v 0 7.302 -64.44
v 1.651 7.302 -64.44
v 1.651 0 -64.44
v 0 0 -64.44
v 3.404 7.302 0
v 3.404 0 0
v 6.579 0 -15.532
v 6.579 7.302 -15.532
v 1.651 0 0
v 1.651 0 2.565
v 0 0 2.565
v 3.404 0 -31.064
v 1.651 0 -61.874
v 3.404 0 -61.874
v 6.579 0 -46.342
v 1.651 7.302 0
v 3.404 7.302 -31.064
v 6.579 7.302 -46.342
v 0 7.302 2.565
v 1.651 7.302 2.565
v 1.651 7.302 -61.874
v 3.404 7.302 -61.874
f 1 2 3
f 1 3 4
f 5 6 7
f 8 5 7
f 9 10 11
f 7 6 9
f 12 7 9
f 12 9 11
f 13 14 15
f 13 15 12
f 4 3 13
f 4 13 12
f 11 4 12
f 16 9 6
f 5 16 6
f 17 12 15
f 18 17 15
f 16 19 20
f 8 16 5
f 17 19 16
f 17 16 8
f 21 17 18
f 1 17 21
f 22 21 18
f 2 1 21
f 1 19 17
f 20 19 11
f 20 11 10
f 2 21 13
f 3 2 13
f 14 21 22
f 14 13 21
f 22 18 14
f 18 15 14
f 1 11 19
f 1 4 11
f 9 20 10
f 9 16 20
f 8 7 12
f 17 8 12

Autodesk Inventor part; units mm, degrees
ref_plane "YZ Plane" through (0, 0, 0) normal (1, 0, 0) x (0, 1, 0)
ref_plane "XZ Plane" through (0, 0, 0) normal (0, 1, 0) x (-1, 0, 0)
ref_plane "XY Plane" through (0, 0, 0) normal (0, 0, 1) x (1, 0, 0)
sketch "Sketch1" plane through (0, 0, 0) normal (0, 1, 0) x (-1, 0, 0)
  line L0 (0, 0) -> (0, -61.8744)
  line L1 (0, 0) -> (-3.4036, 0)
  line L2 (0, -61.8744) -> (-3.4036, -61.8744)
  line L3 (-3.4036, 0) -> (-6.5786, -15.5321)
  line L4 (-6.5786, -15.5321) -> (-3.4036, -31.0642)
  line L5 (-3.4036, -31.0642) -> (-6.5786, -46.3423)
  line L6 (-6.5786, -46.3423) -> (-3.4036, -61.8744)
  dimension "d0" = 61.8744
  dimension "d1" = 3.4036
  dimension "d2" = 3.4036
  dimension "d3" = 15.5321
  dimension "d4" = 31.0642
  dimension "d5" = 15.5321
  dimension "d6" = 3.175
  dimension "d7" = 3.175
extrude "Extrusion1" add sketch "Sketch1" along normal blind 7.3025
sketch "Sketch2" plane through (0, 0, 0) normal (0, 0, 1) x (1, 0, 0)
  line L0 (3.4036, 0) -> (0, 0) projected
  line L1 (0, 7.3025) -> (1.651, 7.3025)
  line L2 (1.651, 7.3025) -> (1.651, 0)
  line L3 (1.651, 0) -> (0, 0)
  line L4 (0, 0) -> (0, 7.3025)
  dimension "d10" = 1.651
sketch "Sketch3" plane through (3.4036, 0, -61.8744) normal (0, 0, -1) x (-1, 0, 0)
  line L0 (0, 0) -> (3.4036, 0) projected
  line L1 (3.4036, 7.3025) -> (1.7526, 7.3025)
  line L2 (1.7526, 7.3025) -> (1.7526, 0)
  line L3 (1.7526, 0) -> (3.4036, 0)
  line L4 (3.4036, 0) -> (3.4036, 7.3025)
  dimension "d11" = 1.651
extrude "Extrusion2" add sketch "Sketch3" along normal blind 2.5654
extrude "Extrusion3" add sketch "Sketch2" along normal blind 2.5654
properties part number "Short_insert_CPY3"
